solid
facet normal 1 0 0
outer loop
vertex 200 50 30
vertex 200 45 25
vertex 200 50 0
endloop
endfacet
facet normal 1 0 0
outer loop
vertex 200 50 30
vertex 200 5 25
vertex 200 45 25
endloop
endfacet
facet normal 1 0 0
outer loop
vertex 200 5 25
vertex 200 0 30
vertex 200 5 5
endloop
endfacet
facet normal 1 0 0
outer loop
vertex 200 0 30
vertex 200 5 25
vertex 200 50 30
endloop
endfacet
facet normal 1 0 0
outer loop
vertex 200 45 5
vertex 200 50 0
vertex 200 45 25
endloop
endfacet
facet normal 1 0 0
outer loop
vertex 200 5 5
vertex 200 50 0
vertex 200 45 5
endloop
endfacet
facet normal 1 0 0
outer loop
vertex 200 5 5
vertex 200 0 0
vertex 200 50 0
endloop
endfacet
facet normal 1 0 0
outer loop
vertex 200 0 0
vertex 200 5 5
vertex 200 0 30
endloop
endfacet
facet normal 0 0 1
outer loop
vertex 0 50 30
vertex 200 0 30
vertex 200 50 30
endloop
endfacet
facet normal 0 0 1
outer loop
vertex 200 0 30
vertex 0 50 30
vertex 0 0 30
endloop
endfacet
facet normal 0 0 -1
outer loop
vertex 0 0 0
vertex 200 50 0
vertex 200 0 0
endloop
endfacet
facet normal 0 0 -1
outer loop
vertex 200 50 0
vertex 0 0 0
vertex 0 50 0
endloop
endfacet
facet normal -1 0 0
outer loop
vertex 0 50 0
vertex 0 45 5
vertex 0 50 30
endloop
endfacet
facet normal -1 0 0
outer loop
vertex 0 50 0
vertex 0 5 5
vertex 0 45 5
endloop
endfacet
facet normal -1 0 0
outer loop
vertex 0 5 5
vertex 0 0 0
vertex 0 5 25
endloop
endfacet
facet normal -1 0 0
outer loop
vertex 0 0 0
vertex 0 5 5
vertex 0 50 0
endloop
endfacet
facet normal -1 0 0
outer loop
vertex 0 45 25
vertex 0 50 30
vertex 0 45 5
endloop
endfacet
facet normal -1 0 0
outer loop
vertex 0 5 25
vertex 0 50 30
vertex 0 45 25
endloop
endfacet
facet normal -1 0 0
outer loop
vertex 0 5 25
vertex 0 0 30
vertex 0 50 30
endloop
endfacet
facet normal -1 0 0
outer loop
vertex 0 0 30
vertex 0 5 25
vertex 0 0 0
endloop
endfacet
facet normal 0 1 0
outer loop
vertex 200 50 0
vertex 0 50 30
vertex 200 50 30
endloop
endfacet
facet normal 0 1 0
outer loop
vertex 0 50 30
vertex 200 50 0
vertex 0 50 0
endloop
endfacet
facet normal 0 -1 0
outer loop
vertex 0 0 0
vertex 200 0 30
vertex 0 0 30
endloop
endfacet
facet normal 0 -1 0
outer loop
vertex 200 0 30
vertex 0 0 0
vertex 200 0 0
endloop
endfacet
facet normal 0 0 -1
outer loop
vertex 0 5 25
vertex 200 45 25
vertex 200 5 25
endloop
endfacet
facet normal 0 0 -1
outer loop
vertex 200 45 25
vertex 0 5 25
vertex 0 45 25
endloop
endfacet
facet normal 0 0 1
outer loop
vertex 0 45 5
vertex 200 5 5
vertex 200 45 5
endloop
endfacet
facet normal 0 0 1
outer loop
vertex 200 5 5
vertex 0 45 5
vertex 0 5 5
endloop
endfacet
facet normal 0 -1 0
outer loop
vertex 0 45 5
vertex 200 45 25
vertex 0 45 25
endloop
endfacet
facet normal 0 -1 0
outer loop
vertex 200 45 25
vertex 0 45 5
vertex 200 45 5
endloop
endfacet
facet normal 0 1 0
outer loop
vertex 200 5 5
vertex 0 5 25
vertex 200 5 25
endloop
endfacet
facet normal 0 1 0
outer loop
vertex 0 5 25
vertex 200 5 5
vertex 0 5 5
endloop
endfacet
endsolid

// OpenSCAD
$fn = 32;

// ----------------------------------------------------------------------
// Box beam: 200-250 mm hollow beam
// ----------------------------------------------------------------------

// --- parameters (mm) ---
beam_l = 200;             // beam length, X
beam_w = 50;              // beam width, Y
beam_h = 30;              // beam height, Z
wall = 5;                 // wall thickness

difference() {
  cube([beam_l, beam_w, beam_h]);
  translate([-1, wall, wall])
    cube([beam_l + 2, beam_w - 2 * wall, beam_h - 2 * wall]);
}
